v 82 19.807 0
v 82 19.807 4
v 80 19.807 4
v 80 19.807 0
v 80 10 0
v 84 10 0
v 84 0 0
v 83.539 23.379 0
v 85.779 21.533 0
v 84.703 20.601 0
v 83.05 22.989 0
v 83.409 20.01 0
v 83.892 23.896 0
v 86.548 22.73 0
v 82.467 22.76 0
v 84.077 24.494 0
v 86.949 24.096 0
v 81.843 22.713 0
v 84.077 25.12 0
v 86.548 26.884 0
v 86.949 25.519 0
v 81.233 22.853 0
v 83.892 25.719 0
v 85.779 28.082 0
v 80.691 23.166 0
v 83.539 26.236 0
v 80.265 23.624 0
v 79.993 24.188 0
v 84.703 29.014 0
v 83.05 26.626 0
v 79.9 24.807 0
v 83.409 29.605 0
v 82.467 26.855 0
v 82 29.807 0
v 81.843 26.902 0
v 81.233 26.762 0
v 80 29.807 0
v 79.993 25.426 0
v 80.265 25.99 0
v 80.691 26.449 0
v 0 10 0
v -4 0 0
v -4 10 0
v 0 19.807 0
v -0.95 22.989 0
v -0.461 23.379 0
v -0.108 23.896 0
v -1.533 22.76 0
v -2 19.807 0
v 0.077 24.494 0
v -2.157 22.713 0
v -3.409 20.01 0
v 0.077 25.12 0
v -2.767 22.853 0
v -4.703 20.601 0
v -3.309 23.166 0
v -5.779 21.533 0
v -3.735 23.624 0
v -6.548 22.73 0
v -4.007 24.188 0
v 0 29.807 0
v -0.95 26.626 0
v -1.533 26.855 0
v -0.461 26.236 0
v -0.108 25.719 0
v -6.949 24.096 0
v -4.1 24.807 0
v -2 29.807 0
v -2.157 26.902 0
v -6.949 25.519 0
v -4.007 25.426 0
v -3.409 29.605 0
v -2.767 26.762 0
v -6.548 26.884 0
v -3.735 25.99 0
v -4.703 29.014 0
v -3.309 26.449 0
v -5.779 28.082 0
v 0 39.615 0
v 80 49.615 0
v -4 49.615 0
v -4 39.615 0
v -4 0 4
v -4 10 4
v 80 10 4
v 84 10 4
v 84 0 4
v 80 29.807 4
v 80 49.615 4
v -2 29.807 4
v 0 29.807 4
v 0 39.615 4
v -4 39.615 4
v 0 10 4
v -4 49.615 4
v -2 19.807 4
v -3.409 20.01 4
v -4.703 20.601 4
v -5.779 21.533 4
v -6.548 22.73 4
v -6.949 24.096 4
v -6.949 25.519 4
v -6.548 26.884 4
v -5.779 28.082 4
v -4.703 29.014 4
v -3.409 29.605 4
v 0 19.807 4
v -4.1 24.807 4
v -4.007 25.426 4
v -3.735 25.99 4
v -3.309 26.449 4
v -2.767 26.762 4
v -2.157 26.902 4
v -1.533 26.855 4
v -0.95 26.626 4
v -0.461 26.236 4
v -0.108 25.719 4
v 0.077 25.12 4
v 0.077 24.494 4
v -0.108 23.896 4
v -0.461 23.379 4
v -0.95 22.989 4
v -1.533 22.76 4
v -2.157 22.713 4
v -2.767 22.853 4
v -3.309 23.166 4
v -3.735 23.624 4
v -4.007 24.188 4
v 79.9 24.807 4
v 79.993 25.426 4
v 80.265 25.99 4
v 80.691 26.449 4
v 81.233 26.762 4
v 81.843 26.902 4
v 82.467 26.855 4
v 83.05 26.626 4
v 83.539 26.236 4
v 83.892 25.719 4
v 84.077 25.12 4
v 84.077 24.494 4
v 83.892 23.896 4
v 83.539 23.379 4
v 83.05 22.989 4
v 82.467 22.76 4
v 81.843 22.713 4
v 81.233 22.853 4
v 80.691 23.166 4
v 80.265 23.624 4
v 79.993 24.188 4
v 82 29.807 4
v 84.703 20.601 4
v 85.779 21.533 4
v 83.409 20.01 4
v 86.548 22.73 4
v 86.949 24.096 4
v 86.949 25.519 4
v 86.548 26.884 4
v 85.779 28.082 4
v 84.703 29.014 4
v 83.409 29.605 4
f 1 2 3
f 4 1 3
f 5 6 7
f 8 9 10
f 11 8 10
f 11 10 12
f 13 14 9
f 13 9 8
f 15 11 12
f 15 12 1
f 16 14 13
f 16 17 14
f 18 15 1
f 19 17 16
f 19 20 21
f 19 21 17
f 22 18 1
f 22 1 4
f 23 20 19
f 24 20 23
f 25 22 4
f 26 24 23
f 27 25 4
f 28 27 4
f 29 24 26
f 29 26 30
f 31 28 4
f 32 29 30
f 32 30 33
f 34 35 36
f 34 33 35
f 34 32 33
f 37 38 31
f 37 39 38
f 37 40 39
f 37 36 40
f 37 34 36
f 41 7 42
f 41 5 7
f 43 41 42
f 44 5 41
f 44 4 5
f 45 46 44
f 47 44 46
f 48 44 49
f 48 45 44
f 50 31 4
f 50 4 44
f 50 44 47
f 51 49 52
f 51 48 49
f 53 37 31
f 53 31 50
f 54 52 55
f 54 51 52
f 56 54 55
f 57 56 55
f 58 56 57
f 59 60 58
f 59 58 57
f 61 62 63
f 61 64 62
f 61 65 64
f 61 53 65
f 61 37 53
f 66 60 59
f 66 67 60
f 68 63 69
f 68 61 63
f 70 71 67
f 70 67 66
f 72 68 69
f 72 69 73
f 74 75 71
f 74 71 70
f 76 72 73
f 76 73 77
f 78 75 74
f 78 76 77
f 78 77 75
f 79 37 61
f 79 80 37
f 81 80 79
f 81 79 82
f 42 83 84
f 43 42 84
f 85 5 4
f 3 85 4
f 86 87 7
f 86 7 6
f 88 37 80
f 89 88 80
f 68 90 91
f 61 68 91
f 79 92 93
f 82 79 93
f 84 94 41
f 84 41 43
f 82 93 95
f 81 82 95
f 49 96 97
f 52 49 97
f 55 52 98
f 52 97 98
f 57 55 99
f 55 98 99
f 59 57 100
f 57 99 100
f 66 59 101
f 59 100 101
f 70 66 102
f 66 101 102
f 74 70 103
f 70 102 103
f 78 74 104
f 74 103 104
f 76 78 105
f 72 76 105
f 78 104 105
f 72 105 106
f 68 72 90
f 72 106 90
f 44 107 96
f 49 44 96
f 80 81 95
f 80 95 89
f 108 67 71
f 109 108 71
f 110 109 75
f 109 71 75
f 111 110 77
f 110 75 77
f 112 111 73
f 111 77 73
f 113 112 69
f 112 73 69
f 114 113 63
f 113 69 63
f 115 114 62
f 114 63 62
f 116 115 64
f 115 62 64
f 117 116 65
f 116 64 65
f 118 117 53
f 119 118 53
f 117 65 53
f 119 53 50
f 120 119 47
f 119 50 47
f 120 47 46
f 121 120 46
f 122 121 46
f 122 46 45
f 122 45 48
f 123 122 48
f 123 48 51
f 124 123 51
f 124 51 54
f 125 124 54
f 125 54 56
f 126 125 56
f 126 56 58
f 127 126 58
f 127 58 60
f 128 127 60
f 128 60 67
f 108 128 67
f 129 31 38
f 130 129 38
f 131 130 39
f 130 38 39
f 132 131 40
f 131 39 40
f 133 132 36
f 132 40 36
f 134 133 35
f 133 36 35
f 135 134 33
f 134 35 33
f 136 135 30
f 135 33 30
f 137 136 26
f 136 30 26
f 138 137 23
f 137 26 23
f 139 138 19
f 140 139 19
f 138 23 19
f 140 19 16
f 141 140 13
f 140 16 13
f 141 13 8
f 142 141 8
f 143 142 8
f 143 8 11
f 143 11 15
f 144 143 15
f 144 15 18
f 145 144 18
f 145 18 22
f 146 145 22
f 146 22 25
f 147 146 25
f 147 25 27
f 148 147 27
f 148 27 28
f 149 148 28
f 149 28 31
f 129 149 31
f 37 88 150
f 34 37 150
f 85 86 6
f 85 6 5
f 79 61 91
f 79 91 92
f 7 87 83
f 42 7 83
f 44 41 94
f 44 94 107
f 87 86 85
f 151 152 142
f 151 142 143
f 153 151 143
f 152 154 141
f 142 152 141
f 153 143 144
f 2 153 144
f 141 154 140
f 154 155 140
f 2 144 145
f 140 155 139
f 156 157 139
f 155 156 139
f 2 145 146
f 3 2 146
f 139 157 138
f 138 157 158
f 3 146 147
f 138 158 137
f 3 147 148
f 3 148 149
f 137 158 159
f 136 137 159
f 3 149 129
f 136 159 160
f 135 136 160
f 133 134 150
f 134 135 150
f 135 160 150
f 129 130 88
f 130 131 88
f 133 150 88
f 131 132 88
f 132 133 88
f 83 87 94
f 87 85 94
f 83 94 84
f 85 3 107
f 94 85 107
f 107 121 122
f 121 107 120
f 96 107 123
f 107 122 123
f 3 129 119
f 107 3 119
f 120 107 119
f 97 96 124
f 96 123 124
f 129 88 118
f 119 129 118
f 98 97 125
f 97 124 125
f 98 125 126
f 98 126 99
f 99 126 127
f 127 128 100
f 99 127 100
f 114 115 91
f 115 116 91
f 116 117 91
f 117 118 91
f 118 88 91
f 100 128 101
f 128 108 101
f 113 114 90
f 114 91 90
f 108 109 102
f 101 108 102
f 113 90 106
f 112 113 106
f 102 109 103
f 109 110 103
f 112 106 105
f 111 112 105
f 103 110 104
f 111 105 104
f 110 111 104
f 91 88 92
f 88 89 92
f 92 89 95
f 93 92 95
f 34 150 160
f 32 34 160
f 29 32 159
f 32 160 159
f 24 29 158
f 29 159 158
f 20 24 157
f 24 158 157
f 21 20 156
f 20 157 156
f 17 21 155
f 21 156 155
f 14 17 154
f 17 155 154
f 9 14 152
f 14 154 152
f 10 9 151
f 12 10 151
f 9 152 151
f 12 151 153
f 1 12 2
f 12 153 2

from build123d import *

# Parameters (mm, degrees)
ESQUISSE1_W             = 80
ESQUISSE1_H             = 49.614813968
BOSS_EXTRU_1_DEPTH      = 4
ESQUISSE3_W             = 4
ESQUISSE3_H             = 10
BOSS_EXTRU_3_DEPTH      = 4
ESQUISSE4_R             = 2.1
ENL_V_MAT_EXTRU_1_DEPTH = 101.232877665


with BuildPart() as part:
    # Esquisse1 → Boss.-Extru.1 (new body)
    with BuildSketch(Plane.XY):
        with Locations((40, 24.807406984)):
            Rectangle(ESQUISSE1_W, ESQUISSE1_H)
    extrude(amount=BOSS_EXTRU_1_DEPTH)

    # Esquisse3 → Boss.-Extru.3 (add)
    with BuildSketch(Plane(origin=(0, 0, 4), x_dir=(-1, 0, 0), z_dir=(0, 0, -1))):
        with Locations((2, 5)):
            Rectangle(ESQUISSE3_W, ESQUISSE3_H)
        with BuildLine():
            Line((0, 19.807406984), (2, 19.807406984))
            ThreePointArc((2, 19.807406984), (7, 24.807406984), (2, 29.807406984))
            Line((2, 29.807406984), (0, 29.807406984))
            Line((0, 29.807406984), (0, 19.807406984))
        make_face()
        with Locations((2, 44.614813968)):
            Rectangle(ESQUISSE3_W, ESQUISSE3_H)
        with BuildLine():
            Line((-80, 29.807406984), (-82, 29.807406984))
            ThreePointArc((-82, 29.807406984), (-87, 24.807406984), (-82, 19.807406984))
            Line((-82, 19.807406984), (-80, 19.807406984))
            Line((-80, 19.807406984), (-80, 29.807406984))
        make_face()
        with Locations((-82, 5)):
            Rectangle(ESQUISSE3_W, ESQUISSE3_H)
    extrude(amount=BOSS_EXTRU_3_DEPTH)

    # Esquisse4 → Enlèv. mat.-Extru.1 (cut, through all)
    with BuildSketch(Plane(origin=(0, 0, 0), x_dir=(-1, 0, 0), z_dir=(0, 0, -1))):
        with Locations((2, 24.807406984)):
            Circle(ESQUISSE4_R)
        with Locations((-82, 24.807406984)):
            Circle(ESQUISSE4_R)
    extrude(amount=-ENL_V_MAT_EXTRU_1_DEPTH, mode=Mode.SUBTRACT)


solid = part.part
